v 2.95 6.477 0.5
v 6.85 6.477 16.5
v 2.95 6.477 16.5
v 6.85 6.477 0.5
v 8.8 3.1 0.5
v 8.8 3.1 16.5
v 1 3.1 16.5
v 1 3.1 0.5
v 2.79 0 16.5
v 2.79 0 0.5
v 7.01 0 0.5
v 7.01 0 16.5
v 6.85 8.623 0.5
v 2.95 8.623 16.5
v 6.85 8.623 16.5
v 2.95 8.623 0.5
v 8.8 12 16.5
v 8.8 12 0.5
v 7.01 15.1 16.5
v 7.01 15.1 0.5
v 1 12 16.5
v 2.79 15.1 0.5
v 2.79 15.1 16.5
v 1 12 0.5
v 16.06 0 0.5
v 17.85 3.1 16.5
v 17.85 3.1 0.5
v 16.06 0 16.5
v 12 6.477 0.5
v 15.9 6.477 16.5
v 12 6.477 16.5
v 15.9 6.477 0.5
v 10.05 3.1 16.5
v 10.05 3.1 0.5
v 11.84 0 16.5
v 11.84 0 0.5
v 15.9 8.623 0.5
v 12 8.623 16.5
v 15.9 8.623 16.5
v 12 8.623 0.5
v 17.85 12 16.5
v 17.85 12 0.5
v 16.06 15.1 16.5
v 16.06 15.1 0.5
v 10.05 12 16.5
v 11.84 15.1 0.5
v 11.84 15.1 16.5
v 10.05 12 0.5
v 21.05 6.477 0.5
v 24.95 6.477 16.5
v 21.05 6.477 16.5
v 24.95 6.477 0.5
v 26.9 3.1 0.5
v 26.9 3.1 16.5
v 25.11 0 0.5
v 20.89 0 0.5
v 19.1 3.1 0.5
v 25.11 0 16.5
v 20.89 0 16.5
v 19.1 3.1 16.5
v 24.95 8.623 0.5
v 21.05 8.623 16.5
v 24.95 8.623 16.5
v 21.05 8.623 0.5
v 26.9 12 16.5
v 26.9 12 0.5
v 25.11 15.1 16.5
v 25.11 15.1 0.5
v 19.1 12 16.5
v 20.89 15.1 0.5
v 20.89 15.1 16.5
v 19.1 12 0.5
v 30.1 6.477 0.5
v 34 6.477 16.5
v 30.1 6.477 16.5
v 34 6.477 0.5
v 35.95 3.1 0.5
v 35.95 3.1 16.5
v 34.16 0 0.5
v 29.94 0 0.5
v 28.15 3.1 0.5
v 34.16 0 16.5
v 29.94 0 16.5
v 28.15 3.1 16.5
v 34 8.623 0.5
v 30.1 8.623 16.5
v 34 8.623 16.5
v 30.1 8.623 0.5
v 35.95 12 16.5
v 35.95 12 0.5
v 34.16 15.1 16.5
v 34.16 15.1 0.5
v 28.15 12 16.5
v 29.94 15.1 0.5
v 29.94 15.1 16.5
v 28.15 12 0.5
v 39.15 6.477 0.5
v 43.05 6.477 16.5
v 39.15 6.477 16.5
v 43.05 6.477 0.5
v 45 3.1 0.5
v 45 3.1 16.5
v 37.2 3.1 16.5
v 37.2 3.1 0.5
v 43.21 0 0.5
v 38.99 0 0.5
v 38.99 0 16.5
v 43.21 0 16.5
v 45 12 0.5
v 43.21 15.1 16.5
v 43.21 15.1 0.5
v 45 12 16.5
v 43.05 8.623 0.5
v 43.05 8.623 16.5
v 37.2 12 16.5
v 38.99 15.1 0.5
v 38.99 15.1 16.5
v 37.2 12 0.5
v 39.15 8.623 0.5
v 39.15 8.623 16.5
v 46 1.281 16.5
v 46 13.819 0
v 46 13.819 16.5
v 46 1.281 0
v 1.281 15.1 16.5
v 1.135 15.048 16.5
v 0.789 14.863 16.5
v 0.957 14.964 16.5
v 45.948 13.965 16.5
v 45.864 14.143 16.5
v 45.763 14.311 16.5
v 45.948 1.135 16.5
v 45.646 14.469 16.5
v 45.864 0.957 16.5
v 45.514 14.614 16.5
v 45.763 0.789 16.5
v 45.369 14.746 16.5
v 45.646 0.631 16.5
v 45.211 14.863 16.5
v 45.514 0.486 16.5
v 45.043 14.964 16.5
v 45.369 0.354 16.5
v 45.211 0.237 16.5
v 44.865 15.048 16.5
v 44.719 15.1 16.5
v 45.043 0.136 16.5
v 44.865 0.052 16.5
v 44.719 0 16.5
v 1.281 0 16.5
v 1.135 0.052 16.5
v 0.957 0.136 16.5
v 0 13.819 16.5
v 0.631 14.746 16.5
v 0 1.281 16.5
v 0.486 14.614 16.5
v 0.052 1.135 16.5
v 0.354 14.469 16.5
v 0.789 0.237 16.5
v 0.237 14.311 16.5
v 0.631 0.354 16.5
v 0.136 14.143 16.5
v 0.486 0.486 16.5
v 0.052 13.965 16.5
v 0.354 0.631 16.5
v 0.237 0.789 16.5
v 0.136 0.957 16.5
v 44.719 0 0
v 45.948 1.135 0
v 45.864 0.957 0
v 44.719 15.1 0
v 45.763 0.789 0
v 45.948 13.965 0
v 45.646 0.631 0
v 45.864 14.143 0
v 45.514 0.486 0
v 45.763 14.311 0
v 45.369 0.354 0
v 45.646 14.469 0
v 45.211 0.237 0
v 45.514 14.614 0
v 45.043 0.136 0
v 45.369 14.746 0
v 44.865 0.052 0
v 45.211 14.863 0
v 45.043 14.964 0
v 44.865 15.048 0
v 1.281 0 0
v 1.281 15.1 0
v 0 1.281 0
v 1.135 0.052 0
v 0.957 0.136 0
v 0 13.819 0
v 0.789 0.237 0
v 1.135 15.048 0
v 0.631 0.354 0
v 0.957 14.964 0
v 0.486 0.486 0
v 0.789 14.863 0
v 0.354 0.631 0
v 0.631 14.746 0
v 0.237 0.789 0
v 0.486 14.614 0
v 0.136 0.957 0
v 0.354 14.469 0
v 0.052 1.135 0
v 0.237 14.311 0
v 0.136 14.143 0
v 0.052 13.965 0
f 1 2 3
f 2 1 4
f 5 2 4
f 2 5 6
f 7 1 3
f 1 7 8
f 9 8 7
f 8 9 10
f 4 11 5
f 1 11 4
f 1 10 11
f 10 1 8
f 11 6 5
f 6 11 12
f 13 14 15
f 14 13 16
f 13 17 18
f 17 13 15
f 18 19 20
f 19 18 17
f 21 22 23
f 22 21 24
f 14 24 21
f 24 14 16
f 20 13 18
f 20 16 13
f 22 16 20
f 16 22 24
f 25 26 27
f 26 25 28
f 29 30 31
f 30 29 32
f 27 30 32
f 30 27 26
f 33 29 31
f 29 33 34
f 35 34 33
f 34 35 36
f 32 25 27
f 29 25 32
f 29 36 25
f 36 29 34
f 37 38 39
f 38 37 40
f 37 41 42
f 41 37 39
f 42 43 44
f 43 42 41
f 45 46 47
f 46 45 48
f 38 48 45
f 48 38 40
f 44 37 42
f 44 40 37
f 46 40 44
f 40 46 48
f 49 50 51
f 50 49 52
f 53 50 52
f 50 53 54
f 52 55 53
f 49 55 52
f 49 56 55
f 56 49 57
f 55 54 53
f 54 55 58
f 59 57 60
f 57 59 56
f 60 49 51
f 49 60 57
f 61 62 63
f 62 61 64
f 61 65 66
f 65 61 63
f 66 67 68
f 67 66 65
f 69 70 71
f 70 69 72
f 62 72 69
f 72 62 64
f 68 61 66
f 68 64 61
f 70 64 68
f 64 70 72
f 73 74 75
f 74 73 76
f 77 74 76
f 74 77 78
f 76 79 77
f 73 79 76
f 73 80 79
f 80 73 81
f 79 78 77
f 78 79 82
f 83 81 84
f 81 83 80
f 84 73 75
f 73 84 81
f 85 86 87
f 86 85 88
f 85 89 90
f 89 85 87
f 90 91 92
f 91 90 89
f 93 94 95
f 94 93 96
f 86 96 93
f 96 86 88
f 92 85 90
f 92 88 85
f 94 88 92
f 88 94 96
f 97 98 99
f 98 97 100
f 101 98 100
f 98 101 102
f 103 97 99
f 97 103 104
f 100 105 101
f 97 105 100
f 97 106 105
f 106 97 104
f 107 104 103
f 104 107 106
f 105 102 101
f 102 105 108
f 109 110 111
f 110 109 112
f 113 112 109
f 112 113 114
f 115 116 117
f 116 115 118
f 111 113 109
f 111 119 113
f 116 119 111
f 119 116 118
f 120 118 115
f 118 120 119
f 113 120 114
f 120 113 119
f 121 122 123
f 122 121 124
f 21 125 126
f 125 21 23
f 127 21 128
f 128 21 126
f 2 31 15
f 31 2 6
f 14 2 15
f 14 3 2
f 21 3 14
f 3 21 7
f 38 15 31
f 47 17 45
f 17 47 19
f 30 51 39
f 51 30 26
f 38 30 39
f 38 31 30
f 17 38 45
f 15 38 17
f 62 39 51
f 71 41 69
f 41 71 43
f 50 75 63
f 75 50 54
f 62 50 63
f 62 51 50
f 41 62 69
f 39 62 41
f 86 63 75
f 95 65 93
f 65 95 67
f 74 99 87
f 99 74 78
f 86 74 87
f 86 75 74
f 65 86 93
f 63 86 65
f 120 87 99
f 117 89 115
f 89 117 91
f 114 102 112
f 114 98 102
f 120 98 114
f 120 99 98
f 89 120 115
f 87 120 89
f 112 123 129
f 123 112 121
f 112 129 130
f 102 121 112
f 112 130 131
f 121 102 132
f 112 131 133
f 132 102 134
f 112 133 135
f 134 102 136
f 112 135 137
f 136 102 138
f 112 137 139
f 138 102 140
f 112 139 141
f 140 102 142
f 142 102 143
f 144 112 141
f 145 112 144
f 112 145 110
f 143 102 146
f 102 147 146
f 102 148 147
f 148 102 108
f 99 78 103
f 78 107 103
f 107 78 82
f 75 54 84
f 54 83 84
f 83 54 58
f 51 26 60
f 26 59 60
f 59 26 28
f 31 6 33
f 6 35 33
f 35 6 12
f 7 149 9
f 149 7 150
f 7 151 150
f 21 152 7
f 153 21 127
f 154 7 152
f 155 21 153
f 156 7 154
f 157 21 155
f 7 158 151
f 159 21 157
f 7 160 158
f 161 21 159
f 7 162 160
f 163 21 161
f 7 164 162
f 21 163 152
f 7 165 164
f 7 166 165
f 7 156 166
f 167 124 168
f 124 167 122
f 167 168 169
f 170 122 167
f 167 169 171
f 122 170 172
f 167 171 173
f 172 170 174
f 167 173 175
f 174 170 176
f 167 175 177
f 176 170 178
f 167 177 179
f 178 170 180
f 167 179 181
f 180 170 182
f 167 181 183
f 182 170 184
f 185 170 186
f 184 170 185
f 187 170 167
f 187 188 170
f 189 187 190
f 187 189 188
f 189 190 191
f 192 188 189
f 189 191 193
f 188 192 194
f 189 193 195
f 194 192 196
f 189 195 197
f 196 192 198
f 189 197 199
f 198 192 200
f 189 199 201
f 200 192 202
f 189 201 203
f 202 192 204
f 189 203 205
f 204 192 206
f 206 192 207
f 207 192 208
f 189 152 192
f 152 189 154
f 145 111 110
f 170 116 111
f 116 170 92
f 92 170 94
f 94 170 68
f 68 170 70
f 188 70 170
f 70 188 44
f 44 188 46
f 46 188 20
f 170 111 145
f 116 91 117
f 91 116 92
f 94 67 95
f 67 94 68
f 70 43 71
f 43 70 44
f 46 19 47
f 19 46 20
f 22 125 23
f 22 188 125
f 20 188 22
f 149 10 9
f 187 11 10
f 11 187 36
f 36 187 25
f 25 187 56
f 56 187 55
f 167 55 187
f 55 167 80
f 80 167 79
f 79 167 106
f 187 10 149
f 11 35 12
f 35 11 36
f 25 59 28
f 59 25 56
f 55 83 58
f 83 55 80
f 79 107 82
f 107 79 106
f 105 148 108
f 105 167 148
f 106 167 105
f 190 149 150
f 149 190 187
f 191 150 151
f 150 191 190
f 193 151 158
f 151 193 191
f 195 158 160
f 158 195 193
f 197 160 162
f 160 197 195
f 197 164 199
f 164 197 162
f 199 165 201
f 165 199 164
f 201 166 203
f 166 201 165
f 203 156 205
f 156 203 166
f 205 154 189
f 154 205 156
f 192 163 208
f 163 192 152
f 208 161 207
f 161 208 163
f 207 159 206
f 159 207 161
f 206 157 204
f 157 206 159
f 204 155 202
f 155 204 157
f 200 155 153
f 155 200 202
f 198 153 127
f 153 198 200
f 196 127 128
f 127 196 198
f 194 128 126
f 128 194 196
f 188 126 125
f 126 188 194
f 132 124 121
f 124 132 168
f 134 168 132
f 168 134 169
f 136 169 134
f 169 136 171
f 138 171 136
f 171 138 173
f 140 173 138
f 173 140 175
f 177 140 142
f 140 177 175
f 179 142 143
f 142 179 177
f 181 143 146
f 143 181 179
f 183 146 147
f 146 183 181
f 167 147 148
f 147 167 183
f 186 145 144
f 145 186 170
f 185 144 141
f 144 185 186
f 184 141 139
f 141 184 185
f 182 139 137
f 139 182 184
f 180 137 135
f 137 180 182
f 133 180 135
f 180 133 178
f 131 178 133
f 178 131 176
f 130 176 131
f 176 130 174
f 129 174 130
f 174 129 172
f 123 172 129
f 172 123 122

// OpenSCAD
/**
 * Remix of hex bit holder by TBRIshtar on Thingiverse:
 * http://www.thingiverse.com/thing:241501
 *
 * This remix mimics the original as close as possible but has the following
 * features:
 *  - Any number of rows and columns, still keeping the edge rows open on the
 *    sides. This is nice if the hex shank has the bit size stamped on it.
 *  - Footer height can be adjusted
 *  - Height can be adjusted
 *  - Allows easy scaling in the X and Y directions if your printer causes
 *    the hex holes to be too tight, like mine does.
 *
 * Author: Fitzterra <fitz_subs@icave.net>  - July 2016
 *
 * License:
 * This work is licensed under the Creative Commons Attribution-ShareAlike 3.0
 * Unported License. To view a copy of this license, visit
 * http://creativecommons.org/licenses/by-sa/3.0/ or send a letter to Creative
 * Commons, PO Box 1866, Mountain View, CA 94042, USA.
 **/

/**
 * This version is specifically for upload to Thingiverse and includes the
 * filleting function from jfhbrook's fillets (see below) library inline in
 * this file.
 * This is because on Thingiverse you can not use custom external scad files
 * when using the customizer.
 * 
 * The original source for this can be fount at:
 * https://github.com/fitzterra/3DP/tree/master/Things/Tools/Hex_Shank_Drill_Bit_Holder
 **/

// Fillets library from:
// https://github.com/jfhbrook/openscad-fillets/blob/master/fillets.scad
// Thanks jfhbrook!
//use <fillets.scad>;

// Number of rows
rows = 2;
// Number of columns
columns = 5;
// Height of the footer
foot = 0.5;
// Height above footer
height = 16;

/* [ Advanced ] */
// Gap between hole edges for rows
rowsGap = 1.1;
// Gap between hole edges for columns
colsGap = 1.25;
// How much space to leave on the columns edges - can be negative to open the hex hole edge.
colsEdge = 1.0;
// How much space on the row top and bottom.
rowsEdge = -0.8;
// Hole diameter
holeDia = 7.8;
// Hex or round hole?
holeShape = "hex"; //[hex, round]
// The corner fillet radius
fRad = 2.0;


/** Direct inclusion from fillets.scad **/
// 2d primitive for inside fillets.
module fil_2d_i(r, angle=90) {
  translate([r, r, 0])
  difference() {
    polygon([
      [0, 0],
      [0, -r],
      [-r * tan(angle/2), -r],
      [-r * sin(angle), -r * cos(angle)]
    ]);
    circle(r=r);
  }
}

/** Direct inclusion from fillets.scad **/
// 3d linear inside fillet.
module fil_linear_i(l, r, angle=90) {
  rotate([0, -90, 180]) {
    linear_extrude(height=l, center=false) {
      fil_2d_i(r, angle);
    }
  }
}

/**
 * Module to generate the bit holder
 *
 **/
module Holder() {
    // Nicely rounded fillets
    $fn=64;

    // Calculate the total width and depth
    w = columns*holeDia + (columns-1)*colsGap + colsEdge*2;
    d = rows*holeDia + (rows-1)*rowsGap + rowsEdge*2;

    // Apply a scaling if needed
    difference() {
        // The main block
        cube([w, d, foot+height]);
        // Sink the hex holes
        translate([colsEdge, rowsEdge, foot])
            for(x=[0:columns-1])
                for(y=[0:rows-1])
                    translate([x*(holeDia+colsGap)+holeDia/2, y*(holeDia+rowsGap)+holeDia/2, 0])
                        cylinder(d=holeDia, h=height+0.1, $fn=holeShape=="hex"?6:100);

        // Fillet the 4 corners
        translate([-0.1, -0.1, -0.1])
            rotate([0, -90, 180])
                fil_linear_i(foot+height+0.2, fRad);
        translate([-0.1, d+0.1, -0.1])
            rotate([0, -90, 90])
                fil_linear_i(foot+height+0.2, fRad);
        translate([w+0.1, -0.1, -0.1])
            rotate([0, -90, -90])
                fil_linear_i(foot+height+0.2, fRad);
        translate([w+0.1, d+0.1, -0.1])
            rotate([0, -90, 0])
                fil_linear_i(foot+height+0.2, fRad);
    }
}

Holder();
